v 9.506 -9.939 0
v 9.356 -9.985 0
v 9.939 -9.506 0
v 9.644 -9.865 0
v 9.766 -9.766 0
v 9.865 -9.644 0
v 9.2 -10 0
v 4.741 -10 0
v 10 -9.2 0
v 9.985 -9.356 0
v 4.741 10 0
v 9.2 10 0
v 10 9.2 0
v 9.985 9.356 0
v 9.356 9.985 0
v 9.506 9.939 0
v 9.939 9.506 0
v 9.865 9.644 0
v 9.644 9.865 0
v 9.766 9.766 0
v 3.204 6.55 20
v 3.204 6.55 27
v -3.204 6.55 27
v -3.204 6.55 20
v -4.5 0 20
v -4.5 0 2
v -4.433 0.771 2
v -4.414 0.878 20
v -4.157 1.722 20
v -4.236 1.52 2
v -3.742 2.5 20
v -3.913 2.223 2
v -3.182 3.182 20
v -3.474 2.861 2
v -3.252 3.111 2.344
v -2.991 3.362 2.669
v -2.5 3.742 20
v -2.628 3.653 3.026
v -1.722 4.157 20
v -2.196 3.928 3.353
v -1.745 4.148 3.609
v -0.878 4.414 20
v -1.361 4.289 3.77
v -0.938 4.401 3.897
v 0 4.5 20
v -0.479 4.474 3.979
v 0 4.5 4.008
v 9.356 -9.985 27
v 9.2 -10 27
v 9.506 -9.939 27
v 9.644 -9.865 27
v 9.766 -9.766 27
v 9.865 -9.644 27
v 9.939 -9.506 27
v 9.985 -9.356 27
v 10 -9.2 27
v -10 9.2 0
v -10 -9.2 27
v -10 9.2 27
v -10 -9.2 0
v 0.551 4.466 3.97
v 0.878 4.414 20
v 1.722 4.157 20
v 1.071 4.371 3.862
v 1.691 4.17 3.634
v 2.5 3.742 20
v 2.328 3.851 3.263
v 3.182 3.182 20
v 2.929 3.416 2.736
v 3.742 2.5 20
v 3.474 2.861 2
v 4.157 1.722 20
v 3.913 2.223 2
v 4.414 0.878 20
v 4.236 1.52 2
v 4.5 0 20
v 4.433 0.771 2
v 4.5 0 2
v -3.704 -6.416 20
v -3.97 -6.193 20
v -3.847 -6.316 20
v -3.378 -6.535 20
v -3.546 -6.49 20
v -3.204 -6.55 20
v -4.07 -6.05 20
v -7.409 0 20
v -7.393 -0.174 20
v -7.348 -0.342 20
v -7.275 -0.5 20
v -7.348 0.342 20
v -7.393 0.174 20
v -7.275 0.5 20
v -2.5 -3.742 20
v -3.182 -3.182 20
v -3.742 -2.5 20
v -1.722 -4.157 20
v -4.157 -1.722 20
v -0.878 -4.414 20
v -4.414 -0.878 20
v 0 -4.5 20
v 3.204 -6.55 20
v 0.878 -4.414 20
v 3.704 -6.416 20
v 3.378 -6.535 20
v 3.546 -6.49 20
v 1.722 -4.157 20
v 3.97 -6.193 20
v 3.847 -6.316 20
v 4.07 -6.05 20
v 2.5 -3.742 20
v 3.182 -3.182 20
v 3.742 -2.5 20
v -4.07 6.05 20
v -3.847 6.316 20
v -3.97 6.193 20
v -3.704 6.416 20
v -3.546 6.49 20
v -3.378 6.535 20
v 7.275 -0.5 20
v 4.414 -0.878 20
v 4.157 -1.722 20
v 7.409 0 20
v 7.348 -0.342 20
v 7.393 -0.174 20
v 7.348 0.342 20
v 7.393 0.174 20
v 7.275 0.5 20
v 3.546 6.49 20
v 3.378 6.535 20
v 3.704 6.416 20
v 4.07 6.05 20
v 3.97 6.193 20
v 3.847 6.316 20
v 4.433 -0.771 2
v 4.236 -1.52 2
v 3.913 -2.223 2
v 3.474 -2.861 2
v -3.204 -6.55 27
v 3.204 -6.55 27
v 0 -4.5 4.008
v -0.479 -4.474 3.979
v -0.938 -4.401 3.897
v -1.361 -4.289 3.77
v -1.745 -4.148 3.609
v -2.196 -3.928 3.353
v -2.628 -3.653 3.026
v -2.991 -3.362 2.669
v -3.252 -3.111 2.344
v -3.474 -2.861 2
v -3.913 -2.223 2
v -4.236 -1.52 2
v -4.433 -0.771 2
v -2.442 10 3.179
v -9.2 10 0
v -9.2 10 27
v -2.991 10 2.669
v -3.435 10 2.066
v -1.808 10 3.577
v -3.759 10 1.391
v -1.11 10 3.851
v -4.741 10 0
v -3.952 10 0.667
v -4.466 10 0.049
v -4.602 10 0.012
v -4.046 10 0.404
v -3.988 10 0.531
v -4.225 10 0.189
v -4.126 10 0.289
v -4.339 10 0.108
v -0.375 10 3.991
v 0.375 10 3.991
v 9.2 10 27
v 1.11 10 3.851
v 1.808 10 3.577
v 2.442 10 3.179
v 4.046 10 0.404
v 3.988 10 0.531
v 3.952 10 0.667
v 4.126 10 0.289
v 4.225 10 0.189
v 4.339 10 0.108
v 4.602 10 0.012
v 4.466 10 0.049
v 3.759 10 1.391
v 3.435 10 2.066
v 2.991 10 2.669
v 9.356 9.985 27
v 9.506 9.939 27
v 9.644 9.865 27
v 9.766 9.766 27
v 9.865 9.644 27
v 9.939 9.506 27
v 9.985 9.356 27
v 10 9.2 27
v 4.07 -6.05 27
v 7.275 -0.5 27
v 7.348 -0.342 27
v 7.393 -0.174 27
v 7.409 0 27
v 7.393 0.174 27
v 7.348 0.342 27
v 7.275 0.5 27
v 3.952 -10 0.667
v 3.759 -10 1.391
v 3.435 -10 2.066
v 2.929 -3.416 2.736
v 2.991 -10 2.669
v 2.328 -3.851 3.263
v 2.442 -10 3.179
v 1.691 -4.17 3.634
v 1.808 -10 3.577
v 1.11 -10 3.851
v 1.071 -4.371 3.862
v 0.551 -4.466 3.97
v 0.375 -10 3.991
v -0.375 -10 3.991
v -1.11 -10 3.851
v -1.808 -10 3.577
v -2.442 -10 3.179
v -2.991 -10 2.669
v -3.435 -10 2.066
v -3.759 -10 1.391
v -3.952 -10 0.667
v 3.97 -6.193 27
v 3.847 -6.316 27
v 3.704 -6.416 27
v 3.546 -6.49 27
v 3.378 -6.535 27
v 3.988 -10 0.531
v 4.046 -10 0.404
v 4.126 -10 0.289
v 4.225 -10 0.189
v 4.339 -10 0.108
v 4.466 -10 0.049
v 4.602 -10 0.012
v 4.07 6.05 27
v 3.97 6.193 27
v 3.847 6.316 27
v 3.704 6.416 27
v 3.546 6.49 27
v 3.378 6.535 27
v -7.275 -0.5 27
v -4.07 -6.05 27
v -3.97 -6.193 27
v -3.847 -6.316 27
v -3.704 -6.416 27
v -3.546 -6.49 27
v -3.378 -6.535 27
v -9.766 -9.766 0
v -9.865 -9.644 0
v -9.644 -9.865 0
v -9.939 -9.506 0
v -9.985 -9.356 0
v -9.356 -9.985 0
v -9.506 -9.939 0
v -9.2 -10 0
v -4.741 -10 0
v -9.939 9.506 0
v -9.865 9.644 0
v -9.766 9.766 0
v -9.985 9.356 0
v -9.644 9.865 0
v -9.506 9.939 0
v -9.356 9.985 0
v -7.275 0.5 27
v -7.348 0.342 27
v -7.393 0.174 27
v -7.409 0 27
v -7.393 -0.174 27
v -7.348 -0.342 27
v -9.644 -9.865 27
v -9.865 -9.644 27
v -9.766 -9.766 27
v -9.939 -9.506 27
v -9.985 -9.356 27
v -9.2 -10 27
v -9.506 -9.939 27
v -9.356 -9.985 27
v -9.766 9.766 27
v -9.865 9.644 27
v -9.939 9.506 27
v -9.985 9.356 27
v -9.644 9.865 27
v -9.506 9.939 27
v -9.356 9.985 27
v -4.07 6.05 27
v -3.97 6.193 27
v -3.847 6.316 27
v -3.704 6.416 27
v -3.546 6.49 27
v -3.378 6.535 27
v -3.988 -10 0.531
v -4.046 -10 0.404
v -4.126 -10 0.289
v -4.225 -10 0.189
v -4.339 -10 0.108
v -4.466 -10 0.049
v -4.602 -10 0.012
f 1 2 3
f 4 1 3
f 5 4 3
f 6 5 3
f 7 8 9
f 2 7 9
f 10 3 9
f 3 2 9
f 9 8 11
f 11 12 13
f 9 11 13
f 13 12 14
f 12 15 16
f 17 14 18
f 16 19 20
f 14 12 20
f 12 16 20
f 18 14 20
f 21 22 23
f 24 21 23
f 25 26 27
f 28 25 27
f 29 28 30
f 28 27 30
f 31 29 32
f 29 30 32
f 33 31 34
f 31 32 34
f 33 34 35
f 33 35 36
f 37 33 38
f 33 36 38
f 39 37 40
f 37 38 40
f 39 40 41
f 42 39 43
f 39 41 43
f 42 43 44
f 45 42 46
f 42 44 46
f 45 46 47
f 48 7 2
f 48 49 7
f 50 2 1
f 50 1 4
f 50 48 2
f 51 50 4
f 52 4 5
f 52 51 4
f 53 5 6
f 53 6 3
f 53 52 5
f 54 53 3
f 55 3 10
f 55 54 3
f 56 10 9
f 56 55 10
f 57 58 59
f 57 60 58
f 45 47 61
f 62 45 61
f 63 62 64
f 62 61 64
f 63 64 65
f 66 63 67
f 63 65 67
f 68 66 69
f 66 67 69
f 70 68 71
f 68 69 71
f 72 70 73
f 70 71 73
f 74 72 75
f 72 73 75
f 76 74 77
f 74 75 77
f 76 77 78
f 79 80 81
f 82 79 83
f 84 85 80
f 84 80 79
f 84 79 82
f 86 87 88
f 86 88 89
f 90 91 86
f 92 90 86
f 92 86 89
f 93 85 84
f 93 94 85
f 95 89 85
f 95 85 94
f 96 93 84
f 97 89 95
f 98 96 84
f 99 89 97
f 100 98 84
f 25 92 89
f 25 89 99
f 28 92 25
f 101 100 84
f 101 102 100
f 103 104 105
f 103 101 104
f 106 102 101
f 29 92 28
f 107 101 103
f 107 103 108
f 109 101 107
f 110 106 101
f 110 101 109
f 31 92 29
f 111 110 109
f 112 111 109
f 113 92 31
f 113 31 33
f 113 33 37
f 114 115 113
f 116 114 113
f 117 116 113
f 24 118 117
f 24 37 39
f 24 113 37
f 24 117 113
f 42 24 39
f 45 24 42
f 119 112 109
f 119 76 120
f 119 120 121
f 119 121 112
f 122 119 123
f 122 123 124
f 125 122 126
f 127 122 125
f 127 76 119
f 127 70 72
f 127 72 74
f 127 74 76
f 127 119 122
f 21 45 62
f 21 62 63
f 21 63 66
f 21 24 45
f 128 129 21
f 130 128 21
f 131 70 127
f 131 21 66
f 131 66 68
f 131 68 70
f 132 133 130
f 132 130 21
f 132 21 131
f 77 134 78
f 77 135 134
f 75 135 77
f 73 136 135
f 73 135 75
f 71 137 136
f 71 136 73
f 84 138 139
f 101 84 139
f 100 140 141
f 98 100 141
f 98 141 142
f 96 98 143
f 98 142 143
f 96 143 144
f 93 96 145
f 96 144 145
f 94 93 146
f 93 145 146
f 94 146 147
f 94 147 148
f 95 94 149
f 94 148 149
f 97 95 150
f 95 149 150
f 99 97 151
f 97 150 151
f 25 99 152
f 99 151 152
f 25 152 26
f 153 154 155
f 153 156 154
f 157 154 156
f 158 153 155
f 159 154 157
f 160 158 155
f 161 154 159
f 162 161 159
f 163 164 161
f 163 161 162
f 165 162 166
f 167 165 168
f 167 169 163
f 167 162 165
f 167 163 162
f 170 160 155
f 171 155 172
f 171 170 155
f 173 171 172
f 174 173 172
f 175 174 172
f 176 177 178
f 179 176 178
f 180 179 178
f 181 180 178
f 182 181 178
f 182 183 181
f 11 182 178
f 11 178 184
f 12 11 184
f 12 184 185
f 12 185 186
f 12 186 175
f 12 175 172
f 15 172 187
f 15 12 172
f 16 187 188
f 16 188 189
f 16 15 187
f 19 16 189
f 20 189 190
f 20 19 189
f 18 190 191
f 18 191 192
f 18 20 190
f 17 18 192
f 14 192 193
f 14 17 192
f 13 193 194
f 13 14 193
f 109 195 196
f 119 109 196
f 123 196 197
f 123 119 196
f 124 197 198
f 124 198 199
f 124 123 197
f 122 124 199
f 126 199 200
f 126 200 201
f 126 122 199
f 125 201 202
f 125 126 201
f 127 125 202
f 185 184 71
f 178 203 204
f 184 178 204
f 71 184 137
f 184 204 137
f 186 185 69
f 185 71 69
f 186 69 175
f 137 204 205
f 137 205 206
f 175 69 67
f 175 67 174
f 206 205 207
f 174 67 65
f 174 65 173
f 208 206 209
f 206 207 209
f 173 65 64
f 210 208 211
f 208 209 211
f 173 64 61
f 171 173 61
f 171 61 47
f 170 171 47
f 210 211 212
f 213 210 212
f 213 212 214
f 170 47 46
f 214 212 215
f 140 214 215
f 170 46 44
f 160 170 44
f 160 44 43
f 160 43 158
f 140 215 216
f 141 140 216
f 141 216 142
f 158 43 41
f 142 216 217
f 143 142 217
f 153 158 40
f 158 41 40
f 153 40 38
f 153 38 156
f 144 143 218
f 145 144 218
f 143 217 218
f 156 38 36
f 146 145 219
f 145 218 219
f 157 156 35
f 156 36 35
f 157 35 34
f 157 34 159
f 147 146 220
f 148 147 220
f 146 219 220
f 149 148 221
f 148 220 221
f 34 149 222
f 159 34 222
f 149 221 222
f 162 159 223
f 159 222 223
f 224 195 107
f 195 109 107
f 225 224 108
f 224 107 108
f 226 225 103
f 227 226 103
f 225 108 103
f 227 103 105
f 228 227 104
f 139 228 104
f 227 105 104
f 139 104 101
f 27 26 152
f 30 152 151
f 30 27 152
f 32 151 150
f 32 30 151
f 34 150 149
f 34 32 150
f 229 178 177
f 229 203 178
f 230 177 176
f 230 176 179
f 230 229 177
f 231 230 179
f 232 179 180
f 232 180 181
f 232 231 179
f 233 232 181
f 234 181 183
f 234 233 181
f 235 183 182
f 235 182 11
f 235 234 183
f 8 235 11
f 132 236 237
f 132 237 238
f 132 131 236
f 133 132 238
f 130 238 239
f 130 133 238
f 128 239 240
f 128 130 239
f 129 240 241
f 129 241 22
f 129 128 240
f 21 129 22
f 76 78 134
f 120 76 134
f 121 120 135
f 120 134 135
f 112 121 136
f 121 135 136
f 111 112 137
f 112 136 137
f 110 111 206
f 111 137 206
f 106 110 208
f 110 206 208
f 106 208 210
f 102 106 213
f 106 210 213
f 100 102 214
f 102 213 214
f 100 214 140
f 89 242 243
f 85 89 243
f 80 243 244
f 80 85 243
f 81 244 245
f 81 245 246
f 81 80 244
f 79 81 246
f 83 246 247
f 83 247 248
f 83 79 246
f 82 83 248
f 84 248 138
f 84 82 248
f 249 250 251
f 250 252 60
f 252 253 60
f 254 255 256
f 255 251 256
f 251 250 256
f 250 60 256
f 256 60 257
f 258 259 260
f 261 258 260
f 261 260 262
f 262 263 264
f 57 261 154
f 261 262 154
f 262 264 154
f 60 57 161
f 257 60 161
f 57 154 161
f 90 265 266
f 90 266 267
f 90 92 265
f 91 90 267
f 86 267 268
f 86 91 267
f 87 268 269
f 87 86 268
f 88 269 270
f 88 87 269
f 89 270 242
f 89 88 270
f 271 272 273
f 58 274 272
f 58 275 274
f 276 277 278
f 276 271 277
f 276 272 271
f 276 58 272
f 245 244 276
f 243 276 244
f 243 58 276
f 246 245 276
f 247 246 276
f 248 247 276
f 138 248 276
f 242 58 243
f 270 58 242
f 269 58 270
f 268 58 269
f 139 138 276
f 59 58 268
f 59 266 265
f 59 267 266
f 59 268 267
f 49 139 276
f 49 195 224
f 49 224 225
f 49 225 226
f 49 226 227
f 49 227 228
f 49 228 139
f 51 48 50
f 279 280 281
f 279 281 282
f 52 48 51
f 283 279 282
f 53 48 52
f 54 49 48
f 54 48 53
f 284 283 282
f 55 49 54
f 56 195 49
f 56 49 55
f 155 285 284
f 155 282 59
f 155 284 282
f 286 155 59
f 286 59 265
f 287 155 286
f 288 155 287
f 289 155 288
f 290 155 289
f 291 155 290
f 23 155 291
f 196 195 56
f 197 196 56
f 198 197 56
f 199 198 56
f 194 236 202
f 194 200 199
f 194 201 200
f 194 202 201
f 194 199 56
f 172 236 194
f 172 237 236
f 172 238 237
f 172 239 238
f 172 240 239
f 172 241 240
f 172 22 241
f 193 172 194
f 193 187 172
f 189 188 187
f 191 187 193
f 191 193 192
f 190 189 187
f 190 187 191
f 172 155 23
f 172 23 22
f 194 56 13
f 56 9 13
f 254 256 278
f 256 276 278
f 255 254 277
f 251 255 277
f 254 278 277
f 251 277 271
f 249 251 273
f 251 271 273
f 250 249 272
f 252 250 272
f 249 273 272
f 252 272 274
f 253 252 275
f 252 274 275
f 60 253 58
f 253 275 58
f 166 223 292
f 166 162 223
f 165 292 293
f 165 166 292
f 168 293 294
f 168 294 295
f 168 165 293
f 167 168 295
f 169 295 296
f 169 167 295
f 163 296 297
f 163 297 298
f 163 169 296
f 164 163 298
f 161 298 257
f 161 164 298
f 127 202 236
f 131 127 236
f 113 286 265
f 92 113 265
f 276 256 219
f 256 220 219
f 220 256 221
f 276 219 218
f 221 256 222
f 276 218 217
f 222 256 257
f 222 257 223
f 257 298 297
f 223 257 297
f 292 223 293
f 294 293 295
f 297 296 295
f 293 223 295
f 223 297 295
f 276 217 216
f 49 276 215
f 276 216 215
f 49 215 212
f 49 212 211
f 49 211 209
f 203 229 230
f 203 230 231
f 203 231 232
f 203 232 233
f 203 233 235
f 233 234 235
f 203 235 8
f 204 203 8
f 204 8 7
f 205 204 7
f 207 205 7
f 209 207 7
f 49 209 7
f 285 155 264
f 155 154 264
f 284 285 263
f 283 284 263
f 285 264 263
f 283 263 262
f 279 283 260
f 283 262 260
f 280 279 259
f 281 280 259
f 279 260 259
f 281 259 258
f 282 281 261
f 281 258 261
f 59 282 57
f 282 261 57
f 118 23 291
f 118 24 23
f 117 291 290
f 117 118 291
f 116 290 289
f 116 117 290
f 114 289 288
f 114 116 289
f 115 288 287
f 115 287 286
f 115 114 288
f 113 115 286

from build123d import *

# Parameters (mm, degrees)
F0_W     = 20
F0_H     = 20
F1_DEPTH = 2
F2_W     = 20
F2_H     = 20
F3_DEPTH = 25
F5_W     = 9
F5_H     = 9
F6_DEPTH = 7
F7_R     = 1
F8_DEPTH = 18
F9_DEPTH = 24.8
F10_R    = 0.8
F11_R    = 0.8


with BuildPart() as f1:
    # F0 (on Top) → F1 (new body)
    with BuildSketch(Plane.XY):
        Rectangle(F0_W, F0_H)
    extrude(amount=F1_DEPTH)

    # F2 (on face) → F3 (join)
    with BuildSketch(Plane.XY.offset(2)):
        Rectangle(F2_W, F2_H)
        Polygon((0, -4.5), (-4.5, -4.5), (-4.5, 0), (-4.5, 4.5), (0, 4.5), (4.5, 4.5), (4.5, 0), (4.5, -4.5), align=None, mode=Mode.SUBTRACT)
    extrude(amount=F3_DEPTH)

    # F5 (on face) → F6 (cut)
    with BuildSketch(Plane.XY.offset(27)):
        Polygon((3.7816442632, -6.55), (7.5632885264, 0), (3.7816442632, 6.55), (-3.7816442632, 6.55), (-7.5632885264, 0), (-3.7816442632, -6.55), align=None)
        Rectangle(F5_W, F5_H, mode=Mode.SUBTRACT)
    extrude(amount=-F6_DEPTH, mode=Mode.SUBTRACT)

    # F7
    f7_edges = [f1.edges().sort_by_distance(p)[0] for p in [
        (3.781644, -6.55, 23.5),
        (7.563289, 0, 23.5),
        (3.781644, 6.55, 23.5),
        (-3.781644, 6.55, 23.5),
        (-7.563289, 0, 23.5),
        (-3.781644, -6.55, 23.5),
    ]]
    fillet(f7_edges, radius=F7_R)

    # F2 (on face) → F8 (join)
    with BuildSketch(Plane.XY.offset(2)):
        Rectangle(F2_W, F2_H)
        Polygon((0, -4.5), (-4.5, -4.5), (-4.5, 0), (-4.5, 4.5), (0, 4.5), (4.5, 4.5), (4.5, 0), (4.5, -4.5), align=None, mode=Mode.SUBTRACT)
        with BuildLine():
            ThreePointArc((4.5, 0), (3.1819805153, -3.1819805153), (0, -4.5))
            Line((0, -4.5), (4.5, -4.5))
            Line((4.5, -4.5), (4.5, 0))
        make_face()
        with BuildLine():
            Line((-4.5, 0), (-4.5, -4.5))
            Line((-4.5, -4.5), (0, -4.5))
            ThreePointArc((0, -4.5), (-3.1819805153, -3.1819805153), (-4.5, 0))
        make_face()
        with BuildLine():
            Line((-4.5, 4.5), (-4.5, 0))
            ThreePointArc((-4.5, 0), (-3.1819805153, 3.1819805153), (0, 4.5))
            Line((0, 4.5), (-4.5, 4.5))
        make_face()
        with BuildLine():
            ThreePointArc((0, 4.5), (3.1819805153, 3.1819805153), (4.5, 0))
            Line((4.5, 0), (4.5, 4.5))
            Line((4.5, 4.5), (0, 4.5))
        make_face()
    extrude(amount=F8_DEPTH)

    # F4 (on face) → F9 (cut, symmetric)
    with BuildSketch(Plane.XZ.offset(10)):
        with BuildLine():
            Line((-4.0082180343, 0), (4.0082180343, 0))
            ThreePointArc((4.0082180343, 0), (0, 4.0082180343), (-4.0082180343, 0))
        make_face()
    extrude(amount=F9_DEPTH, both=True, mode=Mode.SUBTRACT)

    # F10
    f10_edges = [f1.edges().sort_by_distance(p)[0] for p in [
        (4.008218, 0, 0),
        (-4.008218, 0, 0),
    ]]
    fillet(f10_edges, radius=F10_R)

    # F11
    f11_edges = [f1.edges().sort_by_distance(p)[0] for p in [
        (10, -10, 13.5),
        (-10, -10, 13.5),
        (-10, 10, 13.5),
        (10, 10, 13.5),
    ]]
    fillet(f11_edges, radius=F11_R)


solid = f1.part
